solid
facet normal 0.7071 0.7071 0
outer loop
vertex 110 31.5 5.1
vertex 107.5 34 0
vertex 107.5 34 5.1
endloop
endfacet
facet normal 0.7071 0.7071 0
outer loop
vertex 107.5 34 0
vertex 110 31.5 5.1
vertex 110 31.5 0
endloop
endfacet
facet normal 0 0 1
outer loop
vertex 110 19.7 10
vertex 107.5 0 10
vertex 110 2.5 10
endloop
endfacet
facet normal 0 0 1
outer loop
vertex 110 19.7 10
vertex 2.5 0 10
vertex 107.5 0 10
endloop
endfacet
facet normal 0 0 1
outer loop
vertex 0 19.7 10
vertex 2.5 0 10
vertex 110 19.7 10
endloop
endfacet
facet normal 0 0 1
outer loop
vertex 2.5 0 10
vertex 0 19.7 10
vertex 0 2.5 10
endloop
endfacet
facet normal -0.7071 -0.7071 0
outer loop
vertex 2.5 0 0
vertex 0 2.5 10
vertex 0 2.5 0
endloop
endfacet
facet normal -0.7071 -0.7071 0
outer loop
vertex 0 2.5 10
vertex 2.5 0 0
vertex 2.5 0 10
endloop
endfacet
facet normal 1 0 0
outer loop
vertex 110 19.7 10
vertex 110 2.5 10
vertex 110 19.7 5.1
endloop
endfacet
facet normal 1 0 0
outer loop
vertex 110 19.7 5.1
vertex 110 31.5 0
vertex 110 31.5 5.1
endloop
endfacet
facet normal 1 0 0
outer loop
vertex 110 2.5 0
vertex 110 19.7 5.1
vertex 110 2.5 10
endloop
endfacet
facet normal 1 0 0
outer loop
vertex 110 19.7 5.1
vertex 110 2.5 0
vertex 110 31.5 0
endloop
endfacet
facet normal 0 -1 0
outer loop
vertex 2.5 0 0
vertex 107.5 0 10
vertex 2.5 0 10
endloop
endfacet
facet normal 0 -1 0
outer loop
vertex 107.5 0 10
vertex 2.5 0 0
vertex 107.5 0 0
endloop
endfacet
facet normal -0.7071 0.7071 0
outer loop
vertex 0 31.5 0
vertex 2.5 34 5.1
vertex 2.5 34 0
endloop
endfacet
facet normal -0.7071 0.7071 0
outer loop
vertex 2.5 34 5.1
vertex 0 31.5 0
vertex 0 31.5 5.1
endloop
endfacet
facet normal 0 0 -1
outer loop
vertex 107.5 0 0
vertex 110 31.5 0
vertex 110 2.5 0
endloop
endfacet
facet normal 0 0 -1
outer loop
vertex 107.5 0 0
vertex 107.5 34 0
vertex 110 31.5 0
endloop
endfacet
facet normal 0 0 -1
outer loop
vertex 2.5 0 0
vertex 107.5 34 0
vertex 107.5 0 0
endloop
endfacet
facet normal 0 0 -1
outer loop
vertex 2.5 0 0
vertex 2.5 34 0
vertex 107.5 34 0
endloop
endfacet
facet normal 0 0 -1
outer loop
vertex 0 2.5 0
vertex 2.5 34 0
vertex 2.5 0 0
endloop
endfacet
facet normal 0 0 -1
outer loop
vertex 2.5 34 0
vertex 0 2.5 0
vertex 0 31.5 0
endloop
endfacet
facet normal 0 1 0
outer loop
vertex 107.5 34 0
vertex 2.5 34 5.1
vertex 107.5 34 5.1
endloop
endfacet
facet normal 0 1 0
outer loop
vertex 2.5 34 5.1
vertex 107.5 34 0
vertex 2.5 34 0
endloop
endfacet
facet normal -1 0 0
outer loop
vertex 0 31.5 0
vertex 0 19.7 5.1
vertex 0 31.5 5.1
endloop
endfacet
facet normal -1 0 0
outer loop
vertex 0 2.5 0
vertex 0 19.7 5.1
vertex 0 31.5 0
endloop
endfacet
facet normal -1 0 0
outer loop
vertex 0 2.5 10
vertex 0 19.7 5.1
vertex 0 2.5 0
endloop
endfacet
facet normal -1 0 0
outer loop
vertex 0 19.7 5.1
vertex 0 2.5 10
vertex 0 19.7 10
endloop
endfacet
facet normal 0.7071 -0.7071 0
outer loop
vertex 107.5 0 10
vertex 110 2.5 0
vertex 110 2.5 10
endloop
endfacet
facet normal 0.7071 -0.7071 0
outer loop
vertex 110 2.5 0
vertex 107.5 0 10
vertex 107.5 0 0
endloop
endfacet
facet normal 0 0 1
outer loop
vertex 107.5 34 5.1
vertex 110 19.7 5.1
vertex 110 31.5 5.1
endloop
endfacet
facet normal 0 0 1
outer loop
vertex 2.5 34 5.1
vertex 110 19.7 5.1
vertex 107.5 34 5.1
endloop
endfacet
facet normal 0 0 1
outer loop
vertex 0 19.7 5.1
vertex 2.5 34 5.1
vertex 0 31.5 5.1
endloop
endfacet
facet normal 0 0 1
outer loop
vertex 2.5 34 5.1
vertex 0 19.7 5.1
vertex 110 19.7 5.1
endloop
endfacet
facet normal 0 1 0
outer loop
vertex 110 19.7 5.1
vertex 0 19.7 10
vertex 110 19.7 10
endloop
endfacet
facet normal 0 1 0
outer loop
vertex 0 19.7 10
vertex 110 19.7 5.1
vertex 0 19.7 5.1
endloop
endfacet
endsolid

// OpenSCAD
$fn = 32;

// ----------------------------------------------------------------------
// Stepped bar: sidestep, 110 x 34 x 10/5.1 mm
// ----------------------------------------------------------------------

// --- parameters (mm) ---
bar_l = 110;              // bar length, X
bar_w = 34;               // bar width, Y
plate_t = 10;             // thickness of the thick zone, Z
thin_t = 5.1;             // thickness of the thin zone
corner_c = 2.5;           // corner chamfer of the bar
step_cut = 4.9;           // material removed from the thin zone
ledge_y = 19.7;           // start of the ledge from the front edge
depth_1 = 4.9;            // depth of cut 1 from the top face

profile = [[2.5, 0], [107.5, 0], [110, 2.5], [110, 31.5], [107.5, 34], [2.5, 34], [0, 31.5], [0, 2.5]];  // primary outline, 8 points, counter clockwise
void_1 = [[-1, 19.7], [111, 19.7], [111, 35], [-1, 35]];  // ledge cut along one edge, 4 points

// --- the one profile operation ---
difference() {
  linear_extrude(height = plate_t) polygon(points = profile);
  translate([0, 0, plate_t - depth_1])
    linear_extrude(height = depth_1 + 1) polygon(points = void_1);
}
